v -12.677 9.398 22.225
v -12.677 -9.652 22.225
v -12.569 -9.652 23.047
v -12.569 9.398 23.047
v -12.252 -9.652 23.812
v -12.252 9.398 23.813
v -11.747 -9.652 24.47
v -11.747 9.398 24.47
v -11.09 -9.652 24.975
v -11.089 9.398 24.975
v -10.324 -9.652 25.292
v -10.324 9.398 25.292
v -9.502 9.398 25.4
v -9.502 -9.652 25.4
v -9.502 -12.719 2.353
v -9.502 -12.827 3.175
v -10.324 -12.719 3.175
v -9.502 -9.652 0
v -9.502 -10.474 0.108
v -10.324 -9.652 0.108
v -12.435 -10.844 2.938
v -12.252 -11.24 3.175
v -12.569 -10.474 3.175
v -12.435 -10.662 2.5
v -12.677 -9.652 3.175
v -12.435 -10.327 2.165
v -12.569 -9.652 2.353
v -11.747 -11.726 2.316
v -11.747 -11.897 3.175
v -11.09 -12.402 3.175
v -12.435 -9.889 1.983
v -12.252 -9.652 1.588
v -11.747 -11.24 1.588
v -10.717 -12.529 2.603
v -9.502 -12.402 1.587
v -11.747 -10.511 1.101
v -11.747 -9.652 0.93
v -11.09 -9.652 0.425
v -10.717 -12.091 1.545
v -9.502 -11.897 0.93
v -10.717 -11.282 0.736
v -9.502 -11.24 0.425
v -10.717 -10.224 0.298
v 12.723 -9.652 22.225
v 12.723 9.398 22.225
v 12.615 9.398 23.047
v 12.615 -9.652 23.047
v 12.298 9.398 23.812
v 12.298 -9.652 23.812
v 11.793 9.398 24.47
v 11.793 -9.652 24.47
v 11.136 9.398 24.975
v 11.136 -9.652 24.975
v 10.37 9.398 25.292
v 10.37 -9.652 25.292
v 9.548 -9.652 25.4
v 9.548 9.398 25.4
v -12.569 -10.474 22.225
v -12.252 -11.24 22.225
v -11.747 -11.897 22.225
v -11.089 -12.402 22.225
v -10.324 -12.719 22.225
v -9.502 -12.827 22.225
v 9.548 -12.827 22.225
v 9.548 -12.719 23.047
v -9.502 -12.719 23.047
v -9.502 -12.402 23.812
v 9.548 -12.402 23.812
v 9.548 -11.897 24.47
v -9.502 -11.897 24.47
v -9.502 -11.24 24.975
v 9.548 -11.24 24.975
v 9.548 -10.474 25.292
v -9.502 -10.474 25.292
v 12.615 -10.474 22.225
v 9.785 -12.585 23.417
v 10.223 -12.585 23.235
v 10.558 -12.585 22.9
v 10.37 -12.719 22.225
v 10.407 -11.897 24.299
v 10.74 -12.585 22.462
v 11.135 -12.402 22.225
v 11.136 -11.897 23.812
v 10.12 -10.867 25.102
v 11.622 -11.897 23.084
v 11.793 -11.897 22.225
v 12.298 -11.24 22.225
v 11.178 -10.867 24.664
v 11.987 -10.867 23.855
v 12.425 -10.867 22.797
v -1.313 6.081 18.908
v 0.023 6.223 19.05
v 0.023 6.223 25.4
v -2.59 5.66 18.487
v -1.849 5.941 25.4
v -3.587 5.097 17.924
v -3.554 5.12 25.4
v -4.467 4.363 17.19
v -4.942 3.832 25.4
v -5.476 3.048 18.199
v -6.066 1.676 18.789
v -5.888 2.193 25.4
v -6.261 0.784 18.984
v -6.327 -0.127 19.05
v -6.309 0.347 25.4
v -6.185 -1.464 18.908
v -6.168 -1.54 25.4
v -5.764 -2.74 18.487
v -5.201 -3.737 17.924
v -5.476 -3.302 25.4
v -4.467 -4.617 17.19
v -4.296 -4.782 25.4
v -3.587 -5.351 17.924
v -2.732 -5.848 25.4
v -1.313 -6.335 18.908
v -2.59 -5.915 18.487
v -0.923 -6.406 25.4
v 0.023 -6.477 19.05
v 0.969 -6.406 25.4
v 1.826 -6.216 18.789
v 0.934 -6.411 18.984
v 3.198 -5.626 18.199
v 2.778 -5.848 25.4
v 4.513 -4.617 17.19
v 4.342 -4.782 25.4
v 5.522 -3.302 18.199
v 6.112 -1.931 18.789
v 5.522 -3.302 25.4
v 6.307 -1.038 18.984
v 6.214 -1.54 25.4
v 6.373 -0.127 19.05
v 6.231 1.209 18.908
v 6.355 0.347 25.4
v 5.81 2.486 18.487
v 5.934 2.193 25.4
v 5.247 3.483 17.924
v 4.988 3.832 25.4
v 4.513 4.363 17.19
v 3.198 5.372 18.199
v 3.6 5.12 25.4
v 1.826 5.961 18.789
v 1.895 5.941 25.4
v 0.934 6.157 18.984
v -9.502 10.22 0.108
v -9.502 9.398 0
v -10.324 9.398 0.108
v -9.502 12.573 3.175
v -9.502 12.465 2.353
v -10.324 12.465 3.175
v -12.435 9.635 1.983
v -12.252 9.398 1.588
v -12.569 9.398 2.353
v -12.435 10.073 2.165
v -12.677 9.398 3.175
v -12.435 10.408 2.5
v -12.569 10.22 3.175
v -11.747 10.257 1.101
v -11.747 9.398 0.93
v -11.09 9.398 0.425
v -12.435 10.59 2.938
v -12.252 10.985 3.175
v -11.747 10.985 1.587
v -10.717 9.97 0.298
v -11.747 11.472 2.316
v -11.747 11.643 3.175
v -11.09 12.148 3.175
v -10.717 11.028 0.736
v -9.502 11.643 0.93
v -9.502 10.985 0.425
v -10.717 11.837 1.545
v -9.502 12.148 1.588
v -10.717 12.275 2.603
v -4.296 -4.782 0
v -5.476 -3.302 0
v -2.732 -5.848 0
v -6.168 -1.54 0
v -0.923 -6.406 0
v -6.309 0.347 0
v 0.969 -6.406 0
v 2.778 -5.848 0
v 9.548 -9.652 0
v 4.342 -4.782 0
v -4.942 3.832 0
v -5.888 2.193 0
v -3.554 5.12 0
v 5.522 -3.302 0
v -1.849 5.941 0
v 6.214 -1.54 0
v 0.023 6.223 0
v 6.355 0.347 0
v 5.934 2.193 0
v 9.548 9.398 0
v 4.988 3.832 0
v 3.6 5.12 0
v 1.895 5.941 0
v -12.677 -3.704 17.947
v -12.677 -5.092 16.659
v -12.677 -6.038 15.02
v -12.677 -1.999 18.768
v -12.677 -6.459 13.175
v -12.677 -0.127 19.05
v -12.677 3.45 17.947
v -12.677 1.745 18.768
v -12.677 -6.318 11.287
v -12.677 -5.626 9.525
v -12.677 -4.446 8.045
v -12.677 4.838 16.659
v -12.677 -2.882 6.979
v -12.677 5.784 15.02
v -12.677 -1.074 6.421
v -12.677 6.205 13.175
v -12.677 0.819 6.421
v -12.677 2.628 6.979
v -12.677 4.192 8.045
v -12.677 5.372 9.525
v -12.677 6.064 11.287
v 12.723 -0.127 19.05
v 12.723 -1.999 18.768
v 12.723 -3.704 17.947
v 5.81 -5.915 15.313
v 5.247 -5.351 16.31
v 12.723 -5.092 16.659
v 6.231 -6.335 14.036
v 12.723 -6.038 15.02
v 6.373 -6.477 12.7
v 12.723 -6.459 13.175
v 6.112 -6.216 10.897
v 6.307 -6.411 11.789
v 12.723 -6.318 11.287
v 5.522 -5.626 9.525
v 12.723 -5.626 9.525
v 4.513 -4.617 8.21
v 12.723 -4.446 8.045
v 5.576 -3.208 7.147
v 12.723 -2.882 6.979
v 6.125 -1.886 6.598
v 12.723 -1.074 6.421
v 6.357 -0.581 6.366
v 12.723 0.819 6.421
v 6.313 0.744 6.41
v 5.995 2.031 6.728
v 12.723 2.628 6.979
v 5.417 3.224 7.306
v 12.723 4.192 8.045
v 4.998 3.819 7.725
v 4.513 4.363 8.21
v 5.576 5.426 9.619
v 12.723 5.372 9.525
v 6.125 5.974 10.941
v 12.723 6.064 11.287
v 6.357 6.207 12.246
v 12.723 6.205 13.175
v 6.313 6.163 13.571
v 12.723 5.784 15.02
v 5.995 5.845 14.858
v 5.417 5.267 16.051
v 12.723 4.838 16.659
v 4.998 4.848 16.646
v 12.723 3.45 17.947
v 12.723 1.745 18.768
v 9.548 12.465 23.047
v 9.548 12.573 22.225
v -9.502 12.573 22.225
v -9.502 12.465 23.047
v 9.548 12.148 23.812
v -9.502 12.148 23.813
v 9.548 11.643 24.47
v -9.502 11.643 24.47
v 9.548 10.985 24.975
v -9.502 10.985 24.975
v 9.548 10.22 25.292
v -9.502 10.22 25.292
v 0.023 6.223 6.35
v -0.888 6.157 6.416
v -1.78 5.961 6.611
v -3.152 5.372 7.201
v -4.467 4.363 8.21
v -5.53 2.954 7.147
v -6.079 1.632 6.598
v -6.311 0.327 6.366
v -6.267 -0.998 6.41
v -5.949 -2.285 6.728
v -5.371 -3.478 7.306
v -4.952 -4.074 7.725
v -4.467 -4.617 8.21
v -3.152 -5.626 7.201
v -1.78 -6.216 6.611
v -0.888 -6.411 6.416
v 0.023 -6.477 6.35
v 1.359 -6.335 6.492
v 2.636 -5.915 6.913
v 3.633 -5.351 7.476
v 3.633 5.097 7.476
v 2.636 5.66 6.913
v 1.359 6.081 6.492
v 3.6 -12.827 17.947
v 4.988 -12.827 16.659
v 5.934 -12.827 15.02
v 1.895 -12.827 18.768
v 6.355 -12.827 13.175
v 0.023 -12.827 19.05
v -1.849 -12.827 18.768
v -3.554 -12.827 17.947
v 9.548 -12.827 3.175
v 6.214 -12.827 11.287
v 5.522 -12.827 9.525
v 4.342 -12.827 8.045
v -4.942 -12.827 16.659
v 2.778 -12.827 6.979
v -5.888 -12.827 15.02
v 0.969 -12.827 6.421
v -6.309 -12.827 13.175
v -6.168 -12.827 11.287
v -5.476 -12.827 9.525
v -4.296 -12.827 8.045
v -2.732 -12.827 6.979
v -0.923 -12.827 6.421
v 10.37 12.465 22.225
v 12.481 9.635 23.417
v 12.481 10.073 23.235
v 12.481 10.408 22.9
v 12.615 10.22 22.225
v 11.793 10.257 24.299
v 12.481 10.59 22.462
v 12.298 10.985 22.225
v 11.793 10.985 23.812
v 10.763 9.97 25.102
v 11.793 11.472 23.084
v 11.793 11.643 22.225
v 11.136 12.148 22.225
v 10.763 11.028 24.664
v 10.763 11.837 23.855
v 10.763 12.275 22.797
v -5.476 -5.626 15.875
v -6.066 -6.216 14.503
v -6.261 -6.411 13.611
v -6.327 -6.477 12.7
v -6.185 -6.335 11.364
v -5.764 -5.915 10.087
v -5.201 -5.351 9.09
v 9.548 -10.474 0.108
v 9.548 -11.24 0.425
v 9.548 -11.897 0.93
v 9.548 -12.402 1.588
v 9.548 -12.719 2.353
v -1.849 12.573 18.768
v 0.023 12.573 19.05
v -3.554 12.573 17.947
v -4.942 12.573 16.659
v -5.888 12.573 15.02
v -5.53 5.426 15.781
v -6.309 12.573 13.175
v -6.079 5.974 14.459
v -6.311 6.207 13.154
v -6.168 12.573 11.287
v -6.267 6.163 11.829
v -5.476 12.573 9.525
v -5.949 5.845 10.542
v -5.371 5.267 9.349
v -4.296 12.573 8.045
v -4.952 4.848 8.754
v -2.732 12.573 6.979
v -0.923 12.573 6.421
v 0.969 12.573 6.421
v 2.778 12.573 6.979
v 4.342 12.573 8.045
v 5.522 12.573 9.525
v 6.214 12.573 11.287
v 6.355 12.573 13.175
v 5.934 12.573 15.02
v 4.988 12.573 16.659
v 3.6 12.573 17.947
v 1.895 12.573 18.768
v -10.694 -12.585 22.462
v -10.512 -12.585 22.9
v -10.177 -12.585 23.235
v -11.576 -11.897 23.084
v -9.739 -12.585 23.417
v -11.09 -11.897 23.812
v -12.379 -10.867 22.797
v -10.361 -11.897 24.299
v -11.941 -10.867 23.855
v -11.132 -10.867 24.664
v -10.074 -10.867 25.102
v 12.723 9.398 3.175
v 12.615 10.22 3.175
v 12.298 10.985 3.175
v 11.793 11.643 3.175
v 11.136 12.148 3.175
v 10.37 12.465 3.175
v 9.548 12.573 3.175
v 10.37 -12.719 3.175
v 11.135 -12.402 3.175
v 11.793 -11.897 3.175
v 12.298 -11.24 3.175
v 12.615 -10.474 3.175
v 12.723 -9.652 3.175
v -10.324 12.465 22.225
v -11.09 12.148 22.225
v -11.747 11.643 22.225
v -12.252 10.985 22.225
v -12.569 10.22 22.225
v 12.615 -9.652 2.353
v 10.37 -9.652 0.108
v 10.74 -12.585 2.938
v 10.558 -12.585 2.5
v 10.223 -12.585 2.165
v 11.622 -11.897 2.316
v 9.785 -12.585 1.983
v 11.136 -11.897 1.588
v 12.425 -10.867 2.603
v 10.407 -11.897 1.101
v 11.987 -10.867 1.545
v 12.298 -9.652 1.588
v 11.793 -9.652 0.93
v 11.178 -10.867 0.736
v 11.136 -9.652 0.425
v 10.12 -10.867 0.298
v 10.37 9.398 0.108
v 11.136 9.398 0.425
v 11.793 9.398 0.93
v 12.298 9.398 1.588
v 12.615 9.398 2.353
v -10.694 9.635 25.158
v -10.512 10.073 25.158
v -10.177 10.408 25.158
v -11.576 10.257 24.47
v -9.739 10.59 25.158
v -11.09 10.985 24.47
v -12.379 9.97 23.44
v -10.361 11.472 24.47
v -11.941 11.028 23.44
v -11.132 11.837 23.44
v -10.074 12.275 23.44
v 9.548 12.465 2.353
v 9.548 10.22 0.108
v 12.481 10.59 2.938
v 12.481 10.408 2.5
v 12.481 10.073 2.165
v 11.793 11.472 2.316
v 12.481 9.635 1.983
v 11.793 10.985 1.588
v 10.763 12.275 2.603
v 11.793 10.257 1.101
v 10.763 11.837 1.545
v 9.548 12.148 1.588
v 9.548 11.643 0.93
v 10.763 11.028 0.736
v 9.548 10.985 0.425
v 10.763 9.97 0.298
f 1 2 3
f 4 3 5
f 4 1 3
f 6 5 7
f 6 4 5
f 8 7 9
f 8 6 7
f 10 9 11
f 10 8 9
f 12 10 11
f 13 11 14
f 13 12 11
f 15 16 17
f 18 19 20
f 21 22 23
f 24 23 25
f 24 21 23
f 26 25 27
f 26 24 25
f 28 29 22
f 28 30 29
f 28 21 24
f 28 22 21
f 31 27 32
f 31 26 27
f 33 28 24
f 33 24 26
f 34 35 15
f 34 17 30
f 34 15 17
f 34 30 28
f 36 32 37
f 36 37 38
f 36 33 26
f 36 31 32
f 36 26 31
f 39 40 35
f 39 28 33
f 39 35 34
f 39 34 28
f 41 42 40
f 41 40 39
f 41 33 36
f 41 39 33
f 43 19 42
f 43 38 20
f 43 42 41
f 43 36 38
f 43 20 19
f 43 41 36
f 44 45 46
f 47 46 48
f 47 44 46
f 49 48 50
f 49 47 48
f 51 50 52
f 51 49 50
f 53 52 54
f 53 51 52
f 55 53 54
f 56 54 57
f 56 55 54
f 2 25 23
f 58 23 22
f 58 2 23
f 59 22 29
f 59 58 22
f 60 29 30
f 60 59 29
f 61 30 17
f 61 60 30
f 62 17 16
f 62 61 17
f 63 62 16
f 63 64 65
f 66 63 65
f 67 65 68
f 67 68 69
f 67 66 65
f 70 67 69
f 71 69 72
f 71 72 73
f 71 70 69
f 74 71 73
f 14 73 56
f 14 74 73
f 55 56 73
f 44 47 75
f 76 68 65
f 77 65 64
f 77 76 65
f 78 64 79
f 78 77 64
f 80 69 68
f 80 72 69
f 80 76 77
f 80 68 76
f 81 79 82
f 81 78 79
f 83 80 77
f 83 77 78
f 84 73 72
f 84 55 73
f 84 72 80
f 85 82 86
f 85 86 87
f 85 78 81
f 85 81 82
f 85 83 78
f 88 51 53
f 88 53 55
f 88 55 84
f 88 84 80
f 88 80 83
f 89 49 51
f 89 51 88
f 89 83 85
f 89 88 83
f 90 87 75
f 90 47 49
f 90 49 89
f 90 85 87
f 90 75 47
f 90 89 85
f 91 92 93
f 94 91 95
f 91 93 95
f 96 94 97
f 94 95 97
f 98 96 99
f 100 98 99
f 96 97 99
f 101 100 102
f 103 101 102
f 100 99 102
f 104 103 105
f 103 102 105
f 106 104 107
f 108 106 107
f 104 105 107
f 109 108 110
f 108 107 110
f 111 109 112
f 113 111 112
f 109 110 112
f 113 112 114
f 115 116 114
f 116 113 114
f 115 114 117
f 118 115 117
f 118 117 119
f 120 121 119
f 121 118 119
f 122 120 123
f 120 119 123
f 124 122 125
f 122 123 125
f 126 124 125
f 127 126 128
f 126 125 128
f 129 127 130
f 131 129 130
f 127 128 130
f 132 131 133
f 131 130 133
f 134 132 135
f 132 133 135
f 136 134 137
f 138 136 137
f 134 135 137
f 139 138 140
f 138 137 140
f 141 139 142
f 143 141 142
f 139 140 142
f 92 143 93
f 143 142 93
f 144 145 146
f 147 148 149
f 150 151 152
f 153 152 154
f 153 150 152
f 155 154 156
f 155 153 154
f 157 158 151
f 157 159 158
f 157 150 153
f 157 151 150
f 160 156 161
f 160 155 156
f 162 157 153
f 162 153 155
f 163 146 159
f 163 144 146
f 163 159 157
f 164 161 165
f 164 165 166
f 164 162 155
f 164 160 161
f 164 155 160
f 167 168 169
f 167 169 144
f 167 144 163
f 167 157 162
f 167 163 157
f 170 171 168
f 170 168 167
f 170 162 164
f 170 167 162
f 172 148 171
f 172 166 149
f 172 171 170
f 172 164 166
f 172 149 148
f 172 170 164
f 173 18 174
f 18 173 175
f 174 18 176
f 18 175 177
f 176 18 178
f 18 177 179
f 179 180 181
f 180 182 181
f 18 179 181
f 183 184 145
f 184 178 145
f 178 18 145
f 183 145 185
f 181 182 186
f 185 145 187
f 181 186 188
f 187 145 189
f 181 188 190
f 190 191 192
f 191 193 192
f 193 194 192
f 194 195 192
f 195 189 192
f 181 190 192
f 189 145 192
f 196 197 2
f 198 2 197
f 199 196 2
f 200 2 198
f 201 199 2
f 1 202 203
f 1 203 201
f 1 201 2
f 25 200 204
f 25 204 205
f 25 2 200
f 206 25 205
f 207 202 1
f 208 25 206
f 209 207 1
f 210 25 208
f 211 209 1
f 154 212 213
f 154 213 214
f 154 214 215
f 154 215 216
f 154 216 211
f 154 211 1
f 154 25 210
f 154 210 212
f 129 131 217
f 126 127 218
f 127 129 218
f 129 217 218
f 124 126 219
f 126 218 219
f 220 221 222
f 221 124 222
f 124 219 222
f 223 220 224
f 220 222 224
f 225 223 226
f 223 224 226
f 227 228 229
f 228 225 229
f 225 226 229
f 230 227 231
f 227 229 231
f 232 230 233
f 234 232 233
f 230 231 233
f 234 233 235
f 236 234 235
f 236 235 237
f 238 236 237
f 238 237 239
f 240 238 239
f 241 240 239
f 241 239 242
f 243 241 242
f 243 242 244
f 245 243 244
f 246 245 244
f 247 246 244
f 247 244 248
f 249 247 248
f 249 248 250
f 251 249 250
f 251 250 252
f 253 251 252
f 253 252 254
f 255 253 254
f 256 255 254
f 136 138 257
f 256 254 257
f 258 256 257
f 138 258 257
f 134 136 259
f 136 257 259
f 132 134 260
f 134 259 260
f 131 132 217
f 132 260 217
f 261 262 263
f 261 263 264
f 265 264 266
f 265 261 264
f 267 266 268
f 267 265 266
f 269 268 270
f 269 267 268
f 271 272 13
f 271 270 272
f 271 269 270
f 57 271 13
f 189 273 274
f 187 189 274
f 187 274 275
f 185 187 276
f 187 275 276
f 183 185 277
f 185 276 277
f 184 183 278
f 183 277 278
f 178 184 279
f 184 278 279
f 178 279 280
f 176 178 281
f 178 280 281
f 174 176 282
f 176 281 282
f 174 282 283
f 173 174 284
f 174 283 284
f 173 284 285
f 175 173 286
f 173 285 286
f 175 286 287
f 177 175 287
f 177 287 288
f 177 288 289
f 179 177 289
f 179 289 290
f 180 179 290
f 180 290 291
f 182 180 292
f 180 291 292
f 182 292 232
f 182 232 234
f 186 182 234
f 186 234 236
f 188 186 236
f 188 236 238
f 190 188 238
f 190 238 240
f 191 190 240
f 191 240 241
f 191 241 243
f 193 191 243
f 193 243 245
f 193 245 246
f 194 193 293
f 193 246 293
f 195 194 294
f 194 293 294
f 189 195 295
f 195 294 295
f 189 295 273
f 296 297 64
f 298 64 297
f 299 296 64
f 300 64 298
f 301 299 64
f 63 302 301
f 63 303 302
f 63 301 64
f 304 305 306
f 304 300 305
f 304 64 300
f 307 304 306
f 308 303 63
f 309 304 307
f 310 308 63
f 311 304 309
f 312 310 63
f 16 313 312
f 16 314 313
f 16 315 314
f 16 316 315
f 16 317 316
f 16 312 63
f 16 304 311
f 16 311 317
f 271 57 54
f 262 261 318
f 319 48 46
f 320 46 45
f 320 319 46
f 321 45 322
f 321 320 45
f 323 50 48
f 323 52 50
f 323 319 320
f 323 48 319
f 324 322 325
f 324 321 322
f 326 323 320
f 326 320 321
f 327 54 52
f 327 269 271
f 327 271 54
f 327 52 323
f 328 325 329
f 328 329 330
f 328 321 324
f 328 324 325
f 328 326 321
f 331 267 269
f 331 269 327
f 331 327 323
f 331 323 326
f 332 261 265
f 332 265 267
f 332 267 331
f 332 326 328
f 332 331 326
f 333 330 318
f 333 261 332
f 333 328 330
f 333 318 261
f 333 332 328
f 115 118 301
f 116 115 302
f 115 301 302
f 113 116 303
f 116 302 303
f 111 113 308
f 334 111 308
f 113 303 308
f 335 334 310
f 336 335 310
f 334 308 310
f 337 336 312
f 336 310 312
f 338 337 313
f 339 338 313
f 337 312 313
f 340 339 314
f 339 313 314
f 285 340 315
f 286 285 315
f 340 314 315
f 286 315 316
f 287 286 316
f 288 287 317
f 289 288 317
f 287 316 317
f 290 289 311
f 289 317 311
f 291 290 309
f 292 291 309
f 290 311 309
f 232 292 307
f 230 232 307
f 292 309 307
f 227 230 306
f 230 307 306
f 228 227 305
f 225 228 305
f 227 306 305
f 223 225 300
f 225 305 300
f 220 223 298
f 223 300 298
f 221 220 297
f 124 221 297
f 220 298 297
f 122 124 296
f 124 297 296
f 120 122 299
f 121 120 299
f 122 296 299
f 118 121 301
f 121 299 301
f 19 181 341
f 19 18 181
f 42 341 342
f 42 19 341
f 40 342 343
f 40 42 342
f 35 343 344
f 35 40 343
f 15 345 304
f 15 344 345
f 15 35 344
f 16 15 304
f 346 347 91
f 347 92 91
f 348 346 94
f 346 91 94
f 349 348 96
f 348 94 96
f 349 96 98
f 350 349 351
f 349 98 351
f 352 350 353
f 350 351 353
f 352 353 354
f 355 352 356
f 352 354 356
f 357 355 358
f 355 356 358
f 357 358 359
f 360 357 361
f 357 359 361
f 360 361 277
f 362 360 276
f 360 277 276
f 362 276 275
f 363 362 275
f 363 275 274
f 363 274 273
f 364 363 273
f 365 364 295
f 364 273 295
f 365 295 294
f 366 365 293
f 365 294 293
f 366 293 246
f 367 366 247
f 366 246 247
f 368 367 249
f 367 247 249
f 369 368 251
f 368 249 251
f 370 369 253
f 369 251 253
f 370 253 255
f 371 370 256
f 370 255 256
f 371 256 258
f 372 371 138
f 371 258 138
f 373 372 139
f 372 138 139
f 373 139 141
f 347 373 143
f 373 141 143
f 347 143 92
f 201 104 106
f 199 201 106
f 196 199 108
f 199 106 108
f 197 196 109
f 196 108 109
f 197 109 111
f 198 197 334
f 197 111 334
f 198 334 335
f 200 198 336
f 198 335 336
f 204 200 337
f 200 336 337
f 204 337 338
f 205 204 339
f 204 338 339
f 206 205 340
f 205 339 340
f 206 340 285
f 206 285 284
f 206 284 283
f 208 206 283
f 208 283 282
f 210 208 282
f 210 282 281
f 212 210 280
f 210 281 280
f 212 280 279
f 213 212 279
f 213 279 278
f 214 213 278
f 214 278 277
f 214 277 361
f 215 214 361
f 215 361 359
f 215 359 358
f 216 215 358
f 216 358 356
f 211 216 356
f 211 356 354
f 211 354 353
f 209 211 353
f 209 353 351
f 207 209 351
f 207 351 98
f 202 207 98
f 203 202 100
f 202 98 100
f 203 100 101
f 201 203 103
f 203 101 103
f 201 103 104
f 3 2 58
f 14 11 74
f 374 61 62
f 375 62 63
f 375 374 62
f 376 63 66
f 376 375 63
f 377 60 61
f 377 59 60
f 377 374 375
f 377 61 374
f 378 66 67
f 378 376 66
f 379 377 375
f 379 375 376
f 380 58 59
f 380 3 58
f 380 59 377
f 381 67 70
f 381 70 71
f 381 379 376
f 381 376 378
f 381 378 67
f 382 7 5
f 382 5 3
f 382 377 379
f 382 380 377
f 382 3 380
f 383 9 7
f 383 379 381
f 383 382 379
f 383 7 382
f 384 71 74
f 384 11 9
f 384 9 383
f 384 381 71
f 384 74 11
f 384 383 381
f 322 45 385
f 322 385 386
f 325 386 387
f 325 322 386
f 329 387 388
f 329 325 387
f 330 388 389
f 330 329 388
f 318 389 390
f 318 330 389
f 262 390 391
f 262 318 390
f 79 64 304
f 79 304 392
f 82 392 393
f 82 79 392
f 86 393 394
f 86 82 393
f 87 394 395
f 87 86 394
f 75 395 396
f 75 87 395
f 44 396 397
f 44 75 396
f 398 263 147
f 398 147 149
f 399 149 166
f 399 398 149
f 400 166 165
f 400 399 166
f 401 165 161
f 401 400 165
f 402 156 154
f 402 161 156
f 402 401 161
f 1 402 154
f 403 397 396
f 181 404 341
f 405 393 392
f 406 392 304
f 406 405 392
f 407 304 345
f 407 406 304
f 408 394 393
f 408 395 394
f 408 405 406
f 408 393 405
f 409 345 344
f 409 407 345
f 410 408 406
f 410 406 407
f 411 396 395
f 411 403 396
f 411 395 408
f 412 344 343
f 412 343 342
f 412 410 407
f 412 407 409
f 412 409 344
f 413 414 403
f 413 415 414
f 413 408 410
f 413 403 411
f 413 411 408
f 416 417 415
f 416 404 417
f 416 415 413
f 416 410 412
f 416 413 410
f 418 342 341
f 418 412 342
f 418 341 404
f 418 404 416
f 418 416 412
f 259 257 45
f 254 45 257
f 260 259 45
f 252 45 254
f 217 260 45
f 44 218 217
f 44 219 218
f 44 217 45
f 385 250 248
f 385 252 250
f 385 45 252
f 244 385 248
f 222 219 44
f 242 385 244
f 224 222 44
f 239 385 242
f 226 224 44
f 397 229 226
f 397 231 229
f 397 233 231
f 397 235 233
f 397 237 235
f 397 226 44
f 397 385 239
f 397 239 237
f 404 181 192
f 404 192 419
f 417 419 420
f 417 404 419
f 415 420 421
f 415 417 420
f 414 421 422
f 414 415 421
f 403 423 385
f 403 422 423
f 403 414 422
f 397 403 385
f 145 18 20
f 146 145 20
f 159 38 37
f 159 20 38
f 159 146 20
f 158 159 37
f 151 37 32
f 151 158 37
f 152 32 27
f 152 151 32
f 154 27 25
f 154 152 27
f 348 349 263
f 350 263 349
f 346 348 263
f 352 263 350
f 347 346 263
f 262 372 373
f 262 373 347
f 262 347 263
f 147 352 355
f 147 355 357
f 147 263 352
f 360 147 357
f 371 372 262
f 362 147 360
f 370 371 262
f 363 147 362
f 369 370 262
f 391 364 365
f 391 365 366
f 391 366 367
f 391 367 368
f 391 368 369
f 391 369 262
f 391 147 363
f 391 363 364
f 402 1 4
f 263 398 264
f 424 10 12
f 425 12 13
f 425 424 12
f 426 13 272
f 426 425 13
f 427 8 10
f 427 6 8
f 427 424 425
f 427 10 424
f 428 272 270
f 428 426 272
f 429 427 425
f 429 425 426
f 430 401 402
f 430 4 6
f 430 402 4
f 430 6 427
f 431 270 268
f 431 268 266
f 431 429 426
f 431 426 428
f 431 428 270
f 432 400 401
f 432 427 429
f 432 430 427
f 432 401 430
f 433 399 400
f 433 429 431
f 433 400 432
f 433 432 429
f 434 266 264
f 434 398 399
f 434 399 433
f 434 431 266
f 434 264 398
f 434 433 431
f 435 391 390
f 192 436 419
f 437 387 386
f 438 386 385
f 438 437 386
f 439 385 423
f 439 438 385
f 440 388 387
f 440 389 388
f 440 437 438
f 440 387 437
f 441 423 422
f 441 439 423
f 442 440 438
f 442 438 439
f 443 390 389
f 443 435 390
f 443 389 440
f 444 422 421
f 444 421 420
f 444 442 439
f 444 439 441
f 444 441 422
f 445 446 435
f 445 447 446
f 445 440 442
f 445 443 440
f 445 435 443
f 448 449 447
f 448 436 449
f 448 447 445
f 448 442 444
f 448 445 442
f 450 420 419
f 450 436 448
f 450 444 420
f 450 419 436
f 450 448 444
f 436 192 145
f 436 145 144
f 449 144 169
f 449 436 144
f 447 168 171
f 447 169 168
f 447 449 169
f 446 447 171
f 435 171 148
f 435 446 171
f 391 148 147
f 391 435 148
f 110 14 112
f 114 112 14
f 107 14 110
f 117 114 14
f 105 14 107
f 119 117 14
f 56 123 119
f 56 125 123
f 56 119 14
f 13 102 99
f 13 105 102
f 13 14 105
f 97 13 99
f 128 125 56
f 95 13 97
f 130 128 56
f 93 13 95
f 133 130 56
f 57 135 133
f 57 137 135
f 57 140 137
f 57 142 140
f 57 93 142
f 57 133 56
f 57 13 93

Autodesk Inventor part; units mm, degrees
ref_plane "YZ Plane" through (0, 0, 0) normal (1, 0, 0) x (0, 1, 0)
ref_plane "XZ Plane" through (0, 0, 0) normal (0, 1, 0) x (-1, 0, 0)
ref_plane "XY Plane" through (0, 0, 0) normal (0, 0, 1) x (1, 0, 0)
sketch "Sketch1" plane through (0, 0, 0) normal (0, 0, 1) x (1, 0, 0)
  line L0 (-12.677, 12.5729) -> (12.723, 12.5729)
  line L1 (12.723, 12.5729) -> (12.723, -12.8271)
  line L2 (12.723, -12.8271) -> (-12.677, -12.8271)
  line L3 (-12.677, -12.8271) -> (-12.677, 12.5729)
  point P0 (0, 0)
  dimension "d0" = 25.4
  dimension "d1" = 25.4
extrude "Extrusion1" add sketch "Sketch1" along normal blind 25.4
fillet "Fillet1" radius 3.175 12 edges at (0.023, 12.5729, 0) (-12.677, 12.5729, 12.7) (0.023, 12.5729, 25.4) (12.723, 12.5729, 12.7) (12.723, -0.1271, 0) (12.723, -0.1271, 25.4) (12.723, -12.8271, 12.7) (-12.677, -0.1271, 25.4) (0.023, -12.8271, 25.4) (0.023, -12.8271, 0) (-12.677, -0.1271, 0) (-12.677, -12.8271, 12.7)
hole "Hole1" at (0.023, 12.5729, 12.7) direction (0, -1, 0) diameter 12.7 end through all both
hole "Hole2" at (0.023, -0.1271, 0) direction (0, 0, 1) diameter 12.7 end through all
hole "Hole3" at (-12.677, -0.1271, 12.7) direction (1, 0, 0) diameter 12.7 end through all
properties part number "FirstPart"
